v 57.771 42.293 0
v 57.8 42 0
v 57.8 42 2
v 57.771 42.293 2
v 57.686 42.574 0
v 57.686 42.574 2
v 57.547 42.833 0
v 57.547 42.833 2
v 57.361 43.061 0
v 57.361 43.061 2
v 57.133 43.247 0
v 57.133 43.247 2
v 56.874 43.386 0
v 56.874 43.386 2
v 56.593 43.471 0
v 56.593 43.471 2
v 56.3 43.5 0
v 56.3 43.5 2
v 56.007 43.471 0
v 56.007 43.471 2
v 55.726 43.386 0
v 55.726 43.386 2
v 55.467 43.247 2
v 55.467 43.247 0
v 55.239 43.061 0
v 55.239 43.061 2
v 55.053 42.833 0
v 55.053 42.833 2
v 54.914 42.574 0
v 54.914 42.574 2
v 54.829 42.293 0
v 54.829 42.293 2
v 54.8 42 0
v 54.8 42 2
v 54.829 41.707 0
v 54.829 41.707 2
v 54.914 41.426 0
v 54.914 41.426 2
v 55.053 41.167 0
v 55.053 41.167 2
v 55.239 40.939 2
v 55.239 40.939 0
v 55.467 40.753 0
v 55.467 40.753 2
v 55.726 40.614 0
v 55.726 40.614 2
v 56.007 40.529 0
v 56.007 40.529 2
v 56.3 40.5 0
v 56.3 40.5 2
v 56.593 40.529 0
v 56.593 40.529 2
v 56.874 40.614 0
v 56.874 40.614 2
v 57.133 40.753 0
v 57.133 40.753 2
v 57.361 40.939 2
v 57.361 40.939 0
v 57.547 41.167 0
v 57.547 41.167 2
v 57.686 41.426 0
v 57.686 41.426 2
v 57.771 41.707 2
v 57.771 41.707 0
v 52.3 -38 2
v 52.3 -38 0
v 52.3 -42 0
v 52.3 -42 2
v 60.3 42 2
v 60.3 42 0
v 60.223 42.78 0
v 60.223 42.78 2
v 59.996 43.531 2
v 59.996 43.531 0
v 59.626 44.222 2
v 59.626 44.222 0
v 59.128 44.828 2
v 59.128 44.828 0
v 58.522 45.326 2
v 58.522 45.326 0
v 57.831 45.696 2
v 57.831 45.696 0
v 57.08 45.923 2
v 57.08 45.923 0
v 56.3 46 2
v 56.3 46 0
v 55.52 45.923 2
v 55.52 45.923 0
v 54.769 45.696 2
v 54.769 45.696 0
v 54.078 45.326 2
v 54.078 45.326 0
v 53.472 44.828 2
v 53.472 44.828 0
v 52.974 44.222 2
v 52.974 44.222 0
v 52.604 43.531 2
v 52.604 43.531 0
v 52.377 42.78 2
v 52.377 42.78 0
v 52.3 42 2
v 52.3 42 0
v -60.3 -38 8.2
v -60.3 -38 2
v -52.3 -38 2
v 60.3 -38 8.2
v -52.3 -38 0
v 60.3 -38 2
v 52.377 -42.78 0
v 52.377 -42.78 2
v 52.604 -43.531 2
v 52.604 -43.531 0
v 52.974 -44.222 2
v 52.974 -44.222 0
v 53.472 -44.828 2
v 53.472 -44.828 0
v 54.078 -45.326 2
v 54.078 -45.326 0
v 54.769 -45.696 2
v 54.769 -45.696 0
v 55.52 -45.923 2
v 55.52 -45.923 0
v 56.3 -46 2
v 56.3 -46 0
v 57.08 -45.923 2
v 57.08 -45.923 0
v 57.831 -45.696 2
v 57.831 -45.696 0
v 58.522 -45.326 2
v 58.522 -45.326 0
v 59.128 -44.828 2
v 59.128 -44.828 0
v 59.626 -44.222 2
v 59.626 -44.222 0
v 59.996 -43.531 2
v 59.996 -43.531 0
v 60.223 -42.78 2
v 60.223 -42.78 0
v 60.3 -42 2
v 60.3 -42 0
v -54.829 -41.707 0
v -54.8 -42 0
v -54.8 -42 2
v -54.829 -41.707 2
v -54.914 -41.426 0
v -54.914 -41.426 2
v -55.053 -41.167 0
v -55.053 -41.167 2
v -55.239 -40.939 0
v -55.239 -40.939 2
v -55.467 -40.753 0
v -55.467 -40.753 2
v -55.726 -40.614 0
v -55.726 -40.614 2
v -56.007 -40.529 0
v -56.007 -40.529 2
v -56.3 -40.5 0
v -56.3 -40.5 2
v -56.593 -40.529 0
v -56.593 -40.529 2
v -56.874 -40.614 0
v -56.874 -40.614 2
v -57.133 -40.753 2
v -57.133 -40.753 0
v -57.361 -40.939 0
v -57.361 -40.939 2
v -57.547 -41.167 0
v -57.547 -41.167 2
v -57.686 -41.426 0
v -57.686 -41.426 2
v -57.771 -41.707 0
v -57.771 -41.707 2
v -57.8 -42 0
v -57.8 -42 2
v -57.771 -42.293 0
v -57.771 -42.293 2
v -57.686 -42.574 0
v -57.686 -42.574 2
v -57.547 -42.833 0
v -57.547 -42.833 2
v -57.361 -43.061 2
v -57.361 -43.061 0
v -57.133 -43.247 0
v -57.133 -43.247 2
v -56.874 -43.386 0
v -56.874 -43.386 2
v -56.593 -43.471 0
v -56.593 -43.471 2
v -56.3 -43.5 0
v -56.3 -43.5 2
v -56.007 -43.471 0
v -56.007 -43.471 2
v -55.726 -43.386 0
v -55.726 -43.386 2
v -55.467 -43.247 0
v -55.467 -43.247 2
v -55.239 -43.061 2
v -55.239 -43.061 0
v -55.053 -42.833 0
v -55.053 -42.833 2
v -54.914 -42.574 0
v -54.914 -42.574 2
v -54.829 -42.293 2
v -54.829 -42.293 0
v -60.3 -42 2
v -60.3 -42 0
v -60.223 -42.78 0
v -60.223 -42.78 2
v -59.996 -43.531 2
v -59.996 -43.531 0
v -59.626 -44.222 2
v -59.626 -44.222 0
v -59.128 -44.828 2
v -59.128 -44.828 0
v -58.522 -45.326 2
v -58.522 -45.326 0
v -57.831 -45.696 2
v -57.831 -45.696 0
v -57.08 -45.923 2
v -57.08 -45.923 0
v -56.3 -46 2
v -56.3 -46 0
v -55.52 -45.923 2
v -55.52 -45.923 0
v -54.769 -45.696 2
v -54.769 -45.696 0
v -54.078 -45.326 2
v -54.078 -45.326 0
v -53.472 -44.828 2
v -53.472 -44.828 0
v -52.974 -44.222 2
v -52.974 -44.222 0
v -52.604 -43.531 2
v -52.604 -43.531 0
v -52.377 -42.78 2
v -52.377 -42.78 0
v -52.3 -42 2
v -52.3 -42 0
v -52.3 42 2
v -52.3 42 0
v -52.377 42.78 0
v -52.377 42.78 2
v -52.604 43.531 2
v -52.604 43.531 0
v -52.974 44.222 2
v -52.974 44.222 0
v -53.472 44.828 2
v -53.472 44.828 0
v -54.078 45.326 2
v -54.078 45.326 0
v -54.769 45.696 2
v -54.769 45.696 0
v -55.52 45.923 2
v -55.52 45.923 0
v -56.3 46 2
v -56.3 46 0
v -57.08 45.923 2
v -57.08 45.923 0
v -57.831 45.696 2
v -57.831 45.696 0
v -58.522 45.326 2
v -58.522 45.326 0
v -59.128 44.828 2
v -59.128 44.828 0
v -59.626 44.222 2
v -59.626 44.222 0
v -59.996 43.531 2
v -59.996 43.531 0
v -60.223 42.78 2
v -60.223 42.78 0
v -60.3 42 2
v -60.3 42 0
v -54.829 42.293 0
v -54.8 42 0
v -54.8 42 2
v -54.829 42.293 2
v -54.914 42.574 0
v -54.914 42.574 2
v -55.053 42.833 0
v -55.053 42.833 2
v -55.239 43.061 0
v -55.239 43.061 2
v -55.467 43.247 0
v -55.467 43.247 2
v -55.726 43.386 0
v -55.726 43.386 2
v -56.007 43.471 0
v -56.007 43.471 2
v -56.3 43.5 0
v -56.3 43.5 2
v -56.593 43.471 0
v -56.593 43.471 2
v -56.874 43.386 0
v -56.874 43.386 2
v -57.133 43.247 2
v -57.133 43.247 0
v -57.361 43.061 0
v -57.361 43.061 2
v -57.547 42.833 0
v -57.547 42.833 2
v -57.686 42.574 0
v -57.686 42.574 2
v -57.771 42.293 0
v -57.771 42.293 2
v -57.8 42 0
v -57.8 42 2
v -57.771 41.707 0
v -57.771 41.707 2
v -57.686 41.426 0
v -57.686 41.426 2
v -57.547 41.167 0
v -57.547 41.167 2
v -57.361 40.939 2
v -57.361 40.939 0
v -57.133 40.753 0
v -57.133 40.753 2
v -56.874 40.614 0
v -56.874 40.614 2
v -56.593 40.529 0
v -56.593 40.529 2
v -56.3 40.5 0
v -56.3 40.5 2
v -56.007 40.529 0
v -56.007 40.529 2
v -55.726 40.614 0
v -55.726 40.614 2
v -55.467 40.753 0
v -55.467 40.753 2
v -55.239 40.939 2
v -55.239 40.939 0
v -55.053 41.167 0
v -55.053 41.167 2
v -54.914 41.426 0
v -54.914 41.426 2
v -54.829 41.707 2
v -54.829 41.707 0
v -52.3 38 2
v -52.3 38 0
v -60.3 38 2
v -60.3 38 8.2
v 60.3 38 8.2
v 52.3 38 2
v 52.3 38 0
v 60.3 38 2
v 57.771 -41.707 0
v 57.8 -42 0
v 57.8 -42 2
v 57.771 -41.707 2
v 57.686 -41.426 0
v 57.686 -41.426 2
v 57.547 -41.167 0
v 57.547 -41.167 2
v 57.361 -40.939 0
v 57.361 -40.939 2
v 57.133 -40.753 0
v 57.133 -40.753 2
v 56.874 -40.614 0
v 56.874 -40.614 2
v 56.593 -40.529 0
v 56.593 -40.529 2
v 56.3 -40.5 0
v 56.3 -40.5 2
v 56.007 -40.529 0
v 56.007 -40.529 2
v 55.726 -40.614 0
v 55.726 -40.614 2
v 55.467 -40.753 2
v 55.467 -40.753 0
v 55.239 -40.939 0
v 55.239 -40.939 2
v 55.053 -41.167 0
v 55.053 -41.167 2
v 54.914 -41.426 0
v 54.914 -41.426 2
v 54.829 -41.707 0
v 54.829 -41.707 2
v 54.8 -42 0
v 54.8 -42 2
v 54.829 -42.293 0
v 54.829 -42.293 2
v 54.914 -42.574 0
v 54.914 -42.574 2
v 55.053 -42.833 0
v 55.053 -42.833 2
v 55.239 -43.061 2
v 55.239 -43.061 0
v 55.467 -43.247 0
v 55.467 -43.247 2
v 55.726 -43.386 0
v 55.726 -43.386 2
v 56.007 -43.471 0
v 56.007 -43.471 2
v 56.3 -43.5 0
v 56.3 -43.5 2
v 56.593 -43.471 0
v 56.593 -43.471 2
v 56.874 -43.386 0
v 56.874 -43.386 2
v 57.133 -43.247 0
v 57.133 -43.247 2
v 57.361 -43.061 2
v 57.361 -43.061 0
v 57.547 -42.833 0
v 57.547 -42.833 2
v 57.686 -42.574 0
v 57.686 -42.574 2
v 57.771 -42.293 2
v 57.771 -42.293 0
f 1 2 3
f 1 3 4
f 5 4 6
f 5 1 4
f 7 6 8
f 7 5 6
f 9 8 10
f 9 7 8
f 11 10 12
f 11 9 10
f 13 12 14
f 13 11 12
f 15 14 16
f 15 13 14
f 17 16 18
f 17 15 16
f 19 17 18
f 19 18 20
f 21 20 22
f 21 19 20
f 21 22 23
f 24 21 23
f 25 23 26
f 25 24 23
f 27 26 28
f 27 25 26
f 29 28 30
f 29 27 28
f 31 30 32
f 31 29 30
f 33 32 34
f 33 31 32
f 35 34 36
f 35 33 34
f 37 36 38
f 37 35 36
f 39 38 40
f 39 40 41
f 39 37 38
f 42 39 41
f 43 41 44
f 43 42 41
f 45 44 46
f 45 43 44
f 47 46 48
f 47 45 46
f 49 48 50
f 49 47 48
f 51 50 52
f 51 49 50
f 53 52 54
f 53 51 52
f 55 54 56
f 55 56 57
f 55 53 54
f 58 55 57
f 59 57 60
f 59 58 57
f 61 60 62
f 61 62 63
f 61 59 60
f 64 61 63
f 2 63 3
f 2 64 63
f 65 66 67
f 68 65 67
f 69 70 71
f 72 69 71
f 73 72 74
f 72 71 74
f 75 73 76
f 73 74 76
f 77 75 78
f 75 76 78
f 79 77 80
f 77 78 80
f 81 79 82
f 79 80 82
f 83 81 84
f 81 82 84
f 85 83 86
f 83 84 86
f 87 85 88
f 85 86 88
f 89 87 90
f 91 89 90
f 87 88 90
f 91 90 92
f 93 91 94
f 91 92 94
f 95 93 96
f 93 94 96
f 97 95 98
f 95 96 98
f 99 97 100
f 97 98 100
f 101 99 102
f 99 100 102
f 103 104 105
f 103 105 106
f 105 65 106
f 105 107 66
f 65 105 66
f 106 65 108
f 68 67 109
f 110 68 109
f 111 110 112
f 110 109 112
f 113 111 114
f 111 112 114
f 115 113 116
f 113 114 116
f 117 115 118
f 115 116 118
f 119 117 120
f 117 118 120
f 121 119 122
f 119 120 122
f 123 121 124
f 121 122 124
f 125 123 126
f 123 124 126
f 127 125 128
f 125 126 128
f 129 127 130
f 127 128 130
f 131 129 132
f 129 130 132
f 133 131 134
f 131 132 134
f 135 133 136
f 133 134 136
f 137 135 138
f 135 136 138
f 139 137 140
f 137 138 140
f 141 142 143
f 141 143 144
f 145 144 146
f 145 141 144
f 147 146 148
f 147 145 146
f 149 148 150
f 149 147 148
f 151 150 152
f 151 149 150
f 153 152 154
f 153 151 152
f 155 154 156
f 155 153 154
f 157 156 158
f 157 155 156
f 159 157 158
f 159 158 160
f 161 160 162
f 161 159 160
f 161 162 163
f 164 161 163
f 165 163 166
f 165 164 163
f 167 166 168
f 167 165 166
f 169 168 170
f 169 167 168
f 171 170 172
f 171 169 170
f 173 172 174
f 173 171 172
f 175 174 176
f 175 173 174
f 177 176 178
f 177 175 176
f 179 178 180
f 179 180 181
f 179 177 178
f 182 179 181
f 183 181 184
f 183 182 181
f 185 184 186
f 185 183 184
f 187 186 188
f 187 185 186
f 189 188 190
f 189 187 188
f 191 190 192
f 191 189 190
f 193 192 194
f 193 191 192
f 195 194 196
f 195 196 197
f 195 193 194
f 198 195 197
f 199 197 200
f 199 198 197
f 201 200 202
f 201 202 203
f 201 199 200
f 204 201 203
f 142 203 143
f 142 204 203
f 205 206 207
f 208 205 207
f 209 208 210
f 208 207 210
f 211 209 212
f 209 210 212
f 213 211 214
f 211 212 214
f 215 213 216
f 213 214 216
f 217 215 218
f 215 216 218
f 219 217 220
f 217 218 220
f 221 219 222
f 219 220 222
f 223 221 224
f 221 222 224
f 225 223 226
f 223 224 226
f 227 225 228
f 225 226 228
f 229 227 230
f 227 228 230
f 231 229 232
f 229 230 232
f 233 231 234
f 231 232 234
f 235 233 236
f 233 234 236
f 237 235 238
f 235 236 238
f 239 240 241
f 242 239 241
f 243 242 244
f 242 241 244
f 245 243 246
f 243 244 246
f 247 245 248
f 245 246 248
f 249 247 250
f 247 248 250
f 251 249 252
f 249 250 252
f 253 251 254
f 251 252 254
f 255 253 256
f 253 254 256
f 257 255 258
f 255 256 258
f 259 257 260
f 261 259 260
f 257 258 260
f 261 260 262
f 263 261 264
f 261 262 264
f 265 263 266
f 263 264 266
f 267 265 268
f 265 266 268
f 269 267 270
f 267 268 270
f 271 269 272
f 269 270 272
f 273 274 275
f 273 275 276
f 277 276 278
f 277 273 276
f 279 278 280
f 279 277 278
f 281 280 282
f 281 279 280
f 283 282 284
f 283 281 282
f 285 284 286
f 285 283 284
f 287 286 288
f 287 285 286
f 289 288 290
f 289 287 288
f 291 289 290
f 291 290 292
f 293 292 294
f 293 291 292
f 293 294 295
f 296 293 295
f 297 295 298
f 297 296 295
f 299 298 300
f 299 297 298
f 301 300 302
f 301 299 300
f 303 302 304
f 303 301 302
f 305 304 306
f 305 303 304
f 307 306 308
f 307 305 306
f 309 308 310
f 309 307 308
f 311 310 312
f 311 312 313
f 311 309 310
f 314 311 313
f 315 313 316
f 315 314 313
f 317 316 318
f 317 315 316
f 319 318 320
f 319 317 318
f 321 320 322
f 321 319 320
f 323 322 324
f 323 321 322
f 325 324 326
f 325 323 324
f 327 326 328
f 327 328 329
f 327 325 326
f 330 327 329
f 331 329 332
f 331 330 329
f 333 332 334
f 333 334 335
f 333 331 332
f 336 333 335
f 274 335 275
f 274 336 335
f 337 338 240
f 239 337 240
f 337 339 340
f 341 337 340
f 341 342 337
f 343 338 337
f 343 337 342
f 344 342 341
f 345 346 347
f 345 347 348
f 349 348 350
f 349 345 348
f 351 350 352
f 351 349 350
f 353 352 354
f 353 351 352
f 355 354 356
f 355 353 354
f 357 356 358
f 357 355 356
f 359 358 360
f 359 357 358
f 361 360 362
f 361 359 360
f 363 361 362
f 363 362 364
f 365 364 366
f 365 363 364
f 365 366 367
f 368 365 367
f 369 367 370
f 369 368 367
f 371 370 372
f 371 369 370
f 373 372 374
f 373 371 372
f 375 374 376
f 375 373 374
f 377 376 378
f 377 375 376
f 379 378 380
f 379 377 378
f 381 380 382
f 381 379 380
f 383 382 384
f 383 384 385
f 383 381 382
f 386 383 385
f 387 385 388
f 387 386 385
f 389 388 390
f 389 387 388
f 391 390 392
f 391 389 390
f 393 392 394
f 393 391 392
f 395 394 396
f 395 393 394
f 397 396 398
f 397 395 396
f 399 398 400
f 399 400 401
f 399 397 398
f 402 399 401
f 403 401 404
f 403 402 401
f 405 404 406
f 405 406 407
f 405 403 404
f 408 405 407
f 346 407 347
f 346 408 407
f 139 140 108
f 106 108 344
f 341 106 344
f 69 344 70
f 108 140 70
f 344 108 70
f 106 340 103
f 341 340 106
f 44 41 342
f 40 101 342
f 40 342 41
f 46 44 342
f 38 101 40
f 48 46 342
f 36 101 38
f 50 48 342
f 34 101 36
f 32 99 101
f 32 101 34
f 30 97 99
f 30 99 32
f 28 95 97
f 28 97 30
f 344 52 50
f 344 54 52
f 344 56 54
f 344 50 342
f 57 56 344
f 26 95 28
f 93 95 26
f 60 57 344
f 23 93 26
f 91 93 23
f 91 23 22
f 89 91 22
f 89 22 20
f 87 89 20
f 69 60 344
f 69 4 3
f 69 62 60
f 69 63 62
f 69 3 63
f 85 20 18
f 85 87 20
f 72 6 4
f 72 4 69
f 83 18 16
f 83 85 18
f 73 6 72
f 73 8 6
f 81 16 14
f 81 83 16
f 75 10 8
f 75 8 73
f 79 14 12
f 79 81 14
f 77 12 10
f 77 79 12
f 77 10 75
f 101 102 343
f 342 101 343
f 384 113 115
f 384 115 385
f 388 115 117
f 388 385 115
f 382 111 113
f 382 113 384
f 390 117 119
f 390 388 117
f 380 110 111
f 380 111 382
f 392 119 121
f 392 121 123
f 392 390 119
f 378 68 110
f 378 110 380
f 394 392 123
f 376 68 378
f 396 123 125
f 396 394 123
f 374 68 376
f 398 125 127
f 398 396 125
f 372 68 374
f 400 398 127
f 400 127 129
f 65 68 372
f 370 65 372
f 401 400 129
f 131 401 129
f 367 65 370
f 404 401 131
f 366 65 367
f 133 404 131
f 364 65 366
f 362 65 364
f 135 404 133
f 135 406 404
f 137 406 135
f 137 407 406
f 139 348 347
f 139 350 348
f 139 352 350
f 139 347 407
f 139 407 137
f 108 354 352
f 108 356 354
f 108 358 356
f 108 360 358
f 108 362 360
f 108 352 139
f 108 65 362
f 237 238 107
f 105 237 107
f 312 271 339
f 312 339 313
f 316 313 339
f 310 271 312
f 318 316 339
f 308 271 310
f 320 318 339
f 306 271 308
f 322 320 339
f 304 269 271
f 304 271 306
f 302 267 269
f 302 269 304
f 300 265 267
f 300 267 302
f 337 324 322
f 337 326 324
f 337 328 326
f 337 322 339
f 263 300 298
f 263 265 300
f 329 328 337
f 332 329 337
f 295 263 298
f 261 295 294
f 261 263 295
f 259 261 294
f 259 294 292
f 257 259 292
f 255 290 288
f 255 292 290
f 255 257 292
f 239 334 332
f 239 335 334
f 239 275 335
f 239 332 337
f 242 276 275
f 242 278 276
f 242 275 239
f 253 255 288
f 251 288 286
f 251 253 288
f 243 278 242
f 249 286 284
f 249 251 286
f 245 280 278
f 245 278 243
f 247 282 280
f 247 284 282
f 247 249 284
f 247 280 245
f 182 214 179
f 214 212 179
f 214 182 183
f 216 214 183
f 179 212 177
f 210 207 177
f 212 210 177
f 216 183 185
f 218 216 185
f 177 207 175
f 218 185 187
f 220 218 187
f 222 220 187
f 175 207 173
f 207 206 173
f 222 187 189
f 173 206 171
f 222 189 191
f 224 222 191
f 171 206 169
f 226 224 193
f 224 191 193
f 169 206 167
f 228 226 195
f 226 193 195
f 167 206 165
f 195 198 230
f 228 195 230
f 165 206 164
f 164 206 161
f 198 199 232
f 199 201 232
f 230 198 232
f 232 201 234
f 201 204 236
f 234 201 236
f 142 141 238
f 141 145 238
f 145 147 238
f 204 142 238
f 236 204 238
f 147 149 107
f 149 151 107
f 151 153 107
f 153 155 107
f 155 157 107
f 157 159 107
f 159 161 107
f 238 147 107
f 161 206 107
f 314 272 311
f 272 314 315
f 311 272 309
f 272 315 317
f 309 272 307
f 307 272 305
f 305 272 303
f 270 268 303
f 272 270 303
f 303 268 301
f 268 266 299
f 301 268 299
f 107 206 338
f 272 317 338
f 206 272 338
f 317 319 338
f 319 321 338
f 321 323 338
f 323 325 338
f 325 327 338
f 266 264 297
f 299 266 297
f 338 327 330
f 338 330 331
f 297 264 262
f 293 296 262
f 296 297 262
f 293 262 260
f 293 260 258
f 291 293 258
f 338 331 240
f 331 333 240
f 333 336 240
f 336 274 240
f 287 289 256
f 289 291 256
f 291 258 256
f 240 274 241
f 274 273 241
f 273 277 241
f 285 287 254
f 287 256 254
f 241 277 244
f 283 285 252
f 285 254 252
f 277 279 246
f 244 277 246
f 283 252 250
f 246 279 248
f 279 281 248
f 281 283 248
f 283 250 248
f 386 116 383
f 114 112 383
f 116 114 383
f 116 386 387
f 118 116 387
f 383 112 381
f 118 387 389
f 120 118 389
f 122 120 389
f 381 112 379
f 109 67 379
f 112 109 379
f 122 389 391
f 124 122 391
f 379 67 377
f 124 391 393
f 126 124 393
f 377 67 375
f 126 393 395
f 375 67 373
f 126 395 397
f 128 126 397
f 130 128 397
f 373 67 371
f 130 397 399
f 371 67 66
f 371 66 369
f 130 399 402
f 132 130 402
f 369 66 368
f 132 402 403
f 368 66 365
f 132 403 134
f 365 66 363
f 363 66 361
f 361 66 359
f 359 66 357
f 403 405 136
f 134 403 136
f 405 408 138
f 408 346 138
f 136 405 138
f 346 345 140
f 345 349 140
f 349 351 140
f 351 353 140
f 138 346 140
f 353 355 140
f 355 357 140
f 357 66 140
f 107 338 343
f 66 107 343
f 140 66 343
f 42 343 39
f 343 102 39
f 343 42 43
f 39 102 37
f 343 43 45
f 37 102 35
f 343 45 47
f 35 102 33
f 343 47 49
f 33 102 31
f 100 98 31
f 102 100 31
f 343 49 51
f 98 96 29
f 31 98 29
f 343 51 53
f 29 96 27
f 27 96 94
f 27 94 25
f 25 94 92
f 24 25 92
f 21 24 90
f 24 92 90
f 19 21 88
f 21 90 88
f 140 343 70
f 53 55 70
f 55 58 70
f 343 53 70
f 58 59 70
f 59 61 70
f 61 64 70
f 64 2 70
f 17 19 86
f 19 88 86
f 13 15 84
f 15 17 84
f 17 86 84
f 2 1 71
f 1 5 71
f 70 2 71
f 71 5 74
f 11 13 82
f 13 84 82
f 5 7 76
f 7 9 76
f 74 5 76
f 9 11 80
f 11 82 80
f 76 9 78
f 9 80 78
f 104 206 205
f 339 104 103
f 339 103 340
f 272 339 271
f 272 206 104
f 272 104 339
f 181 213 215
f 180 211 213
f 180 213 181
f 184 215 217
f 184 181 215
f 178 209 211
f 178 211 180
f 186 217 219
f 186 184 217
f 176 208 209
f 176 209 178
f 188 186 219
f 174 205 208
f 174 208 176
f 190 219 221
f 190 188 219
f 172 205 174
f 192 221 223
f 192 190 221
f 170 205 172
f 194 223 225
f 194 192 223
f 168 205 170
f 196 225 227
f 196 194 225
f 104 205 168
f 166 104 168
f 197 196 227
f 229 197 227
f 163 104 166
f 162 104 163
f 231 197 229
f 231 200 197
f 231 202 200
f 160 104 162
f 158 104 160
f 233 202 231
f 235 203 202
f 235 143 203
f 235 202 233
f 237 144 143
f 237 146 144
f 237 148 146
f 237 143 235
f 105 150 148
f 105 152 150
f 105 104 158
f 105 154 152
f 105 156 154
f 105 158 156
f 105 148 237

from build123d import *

# Parameters (mm, degrees)
SKETCH1_R           = 4
SKETCH1_R_2         = 1.5
SKETCH1_W           = 120.6
SKETCH1_H           = 76
BOSS_EXTRUDE1_DEPTH = 2
SKETCH4_W           = 120.6
SKETCH4_H           = 76
BOSS_EXTRUDE3_DEPTH = 6.2


with BuildPart() as part:
    # Sketch1 → Boss-Extrude1 (new body)
    # profile 1 of 13: a face of its own
    with BuildSketch(Plane.XY):
        with Locations((-56.3, 42)):
            Circle(SKETCH1_R)
        with Locations((-56.3, 42)):
            Circle(SKETCH1_R_2, mode=Mode.SUBTRACT)
    # profile 2 of 13: a face of its own
    with BuildSketch(Plane.XY):
        with BuildLine():
            Line((-60.3, 42), (-60.3, 38))
            Line((-60.3, 38), (-56.3, 38))
            ThreePointArc((-56.3, 38), (-59.128427125, 39.171572875), (-60.3, 42))
        make_face()
    # profile 3 of 13: a face of its own
    with BuildSketch(Plane.XY):
        with BuildLine():
            ThreePointArc((-52.3, 42), (-53.471572875, 39.171572875), (-56.3, 38))
            Line((-56.3, 38), (-52.3, 38))
            Line((-52.3, 38), (-52.3, 42))
        make_face()
    # profile 4 of 13: a face of its own
    with BuildSketch(Plane.XY):
        Rectangle(SKETCH1_W, SKETCH1_H)
    # profile 5 of 13: a face of its own
    with BuildSketch(Plane.XY):
        with BuildLine():
            ThreePointArc((60.3, 42), (59.128427107, 39.171572857), (56.299999949, 38))
            Line((56.299999949, 38), (60.3, 38))
            Line((60.3, 38), (60.3, 42))
        make_face()
    # profile 6 of 13: a face of its own
    with BuildSketch(Plane.XY):
        with Locations((56.3, 42)):
            Circle(SKETCH1_R)
        with Locations((56.3, 42)):
            Circle(SKETCH1_R_2, mode=Mode.SUBTRACT)
    # profile 7 of 13: a face of its own
    with BuildSketch(Plane.XY):
        with BuildLine():
            Line((52.3, 42), (52.3, 38))
            Line((52.3, 38), (56.299999949, 38))
            ThreePointArc((56.299999949, 38), (53.471572857, 39.171572893), (52.3, 42))
        make_face()
    # profile 8 of 13: a face of its own
    with BuildSketch(Plane.XY):
        with BuildLine():
            Line((-52.3, -38), (-56.3, -38))
            ThreePointArc((-56.3, -38), (-53.471572875, -39.171572875), (-52.3, -42))
            Line((-52.3, -42), (-52.3, -38))
        make_face()
    # profile 9 of 13: a face of its own
    with BuildSketch(Plane.XY):
        with BuildLine():
            Line((-56.3, -38), (-60.3, -38))
            Line((-60.3, -38), (-60.3, -42))
            ThreePointArc((-60.3, -42), (-59.128427125, -39.171572875), (-56.3, -38))
        make_face()
    # profile 10 of 13: a face of its own
    with BuildSketch(Plane.XY):
        with Locations((-56.3, -42)):
            Circle(SKETCH1_R)
        with Locations((-56.3, -42)):
            Circle(SKETCH1_R_2, mode=Mode.SUBTRACT)
    # profile 11 of 13: a face of its own
    with BuildSketch(Plane.XY):
        with BuildLine():
            Line((56.3, -38), (52.3, -38))
            Line((52.3, -38), (52.3, -42))
            ThreePointArc((52.3, -42), (53.471572875, -39.171572875), (56.3, -38))
        make_face()
    # profile 12 of 13: a face of its own
    with BuildSketch(Plane.XY):
        with Locations((56.3, -42)):
            Circle(SKETCH1_R)
        with Locations((56.3, -42)):
            Circle(SKETCH1_R_2, mode=Mode.SUBTRACT)
    # profile 13 of 13: a face of its own
    with BuildSketch(Plane.XY):
        with BuildLine():
            Line((60.3, -38), (56.3, -38))
            ThreePointArc((56.3, -38), (59.128427125, -39.171572875), (60.3, -42))
            Line((60.3, -42), (60.3, -38))
        make_face()
    extrude(amount=BOSS_EXTRUDE1_DEPTH)

    # Sketch4 → Boss-Extrude3 (add)
    with BuildSketch(Plane.XY.offset(2)):
        Rectangle(SKETCH4_W, SKETCH4_H)
    extrude(amount=BOSS_EXTRUDE3_DEPTH)


solid = part.part
